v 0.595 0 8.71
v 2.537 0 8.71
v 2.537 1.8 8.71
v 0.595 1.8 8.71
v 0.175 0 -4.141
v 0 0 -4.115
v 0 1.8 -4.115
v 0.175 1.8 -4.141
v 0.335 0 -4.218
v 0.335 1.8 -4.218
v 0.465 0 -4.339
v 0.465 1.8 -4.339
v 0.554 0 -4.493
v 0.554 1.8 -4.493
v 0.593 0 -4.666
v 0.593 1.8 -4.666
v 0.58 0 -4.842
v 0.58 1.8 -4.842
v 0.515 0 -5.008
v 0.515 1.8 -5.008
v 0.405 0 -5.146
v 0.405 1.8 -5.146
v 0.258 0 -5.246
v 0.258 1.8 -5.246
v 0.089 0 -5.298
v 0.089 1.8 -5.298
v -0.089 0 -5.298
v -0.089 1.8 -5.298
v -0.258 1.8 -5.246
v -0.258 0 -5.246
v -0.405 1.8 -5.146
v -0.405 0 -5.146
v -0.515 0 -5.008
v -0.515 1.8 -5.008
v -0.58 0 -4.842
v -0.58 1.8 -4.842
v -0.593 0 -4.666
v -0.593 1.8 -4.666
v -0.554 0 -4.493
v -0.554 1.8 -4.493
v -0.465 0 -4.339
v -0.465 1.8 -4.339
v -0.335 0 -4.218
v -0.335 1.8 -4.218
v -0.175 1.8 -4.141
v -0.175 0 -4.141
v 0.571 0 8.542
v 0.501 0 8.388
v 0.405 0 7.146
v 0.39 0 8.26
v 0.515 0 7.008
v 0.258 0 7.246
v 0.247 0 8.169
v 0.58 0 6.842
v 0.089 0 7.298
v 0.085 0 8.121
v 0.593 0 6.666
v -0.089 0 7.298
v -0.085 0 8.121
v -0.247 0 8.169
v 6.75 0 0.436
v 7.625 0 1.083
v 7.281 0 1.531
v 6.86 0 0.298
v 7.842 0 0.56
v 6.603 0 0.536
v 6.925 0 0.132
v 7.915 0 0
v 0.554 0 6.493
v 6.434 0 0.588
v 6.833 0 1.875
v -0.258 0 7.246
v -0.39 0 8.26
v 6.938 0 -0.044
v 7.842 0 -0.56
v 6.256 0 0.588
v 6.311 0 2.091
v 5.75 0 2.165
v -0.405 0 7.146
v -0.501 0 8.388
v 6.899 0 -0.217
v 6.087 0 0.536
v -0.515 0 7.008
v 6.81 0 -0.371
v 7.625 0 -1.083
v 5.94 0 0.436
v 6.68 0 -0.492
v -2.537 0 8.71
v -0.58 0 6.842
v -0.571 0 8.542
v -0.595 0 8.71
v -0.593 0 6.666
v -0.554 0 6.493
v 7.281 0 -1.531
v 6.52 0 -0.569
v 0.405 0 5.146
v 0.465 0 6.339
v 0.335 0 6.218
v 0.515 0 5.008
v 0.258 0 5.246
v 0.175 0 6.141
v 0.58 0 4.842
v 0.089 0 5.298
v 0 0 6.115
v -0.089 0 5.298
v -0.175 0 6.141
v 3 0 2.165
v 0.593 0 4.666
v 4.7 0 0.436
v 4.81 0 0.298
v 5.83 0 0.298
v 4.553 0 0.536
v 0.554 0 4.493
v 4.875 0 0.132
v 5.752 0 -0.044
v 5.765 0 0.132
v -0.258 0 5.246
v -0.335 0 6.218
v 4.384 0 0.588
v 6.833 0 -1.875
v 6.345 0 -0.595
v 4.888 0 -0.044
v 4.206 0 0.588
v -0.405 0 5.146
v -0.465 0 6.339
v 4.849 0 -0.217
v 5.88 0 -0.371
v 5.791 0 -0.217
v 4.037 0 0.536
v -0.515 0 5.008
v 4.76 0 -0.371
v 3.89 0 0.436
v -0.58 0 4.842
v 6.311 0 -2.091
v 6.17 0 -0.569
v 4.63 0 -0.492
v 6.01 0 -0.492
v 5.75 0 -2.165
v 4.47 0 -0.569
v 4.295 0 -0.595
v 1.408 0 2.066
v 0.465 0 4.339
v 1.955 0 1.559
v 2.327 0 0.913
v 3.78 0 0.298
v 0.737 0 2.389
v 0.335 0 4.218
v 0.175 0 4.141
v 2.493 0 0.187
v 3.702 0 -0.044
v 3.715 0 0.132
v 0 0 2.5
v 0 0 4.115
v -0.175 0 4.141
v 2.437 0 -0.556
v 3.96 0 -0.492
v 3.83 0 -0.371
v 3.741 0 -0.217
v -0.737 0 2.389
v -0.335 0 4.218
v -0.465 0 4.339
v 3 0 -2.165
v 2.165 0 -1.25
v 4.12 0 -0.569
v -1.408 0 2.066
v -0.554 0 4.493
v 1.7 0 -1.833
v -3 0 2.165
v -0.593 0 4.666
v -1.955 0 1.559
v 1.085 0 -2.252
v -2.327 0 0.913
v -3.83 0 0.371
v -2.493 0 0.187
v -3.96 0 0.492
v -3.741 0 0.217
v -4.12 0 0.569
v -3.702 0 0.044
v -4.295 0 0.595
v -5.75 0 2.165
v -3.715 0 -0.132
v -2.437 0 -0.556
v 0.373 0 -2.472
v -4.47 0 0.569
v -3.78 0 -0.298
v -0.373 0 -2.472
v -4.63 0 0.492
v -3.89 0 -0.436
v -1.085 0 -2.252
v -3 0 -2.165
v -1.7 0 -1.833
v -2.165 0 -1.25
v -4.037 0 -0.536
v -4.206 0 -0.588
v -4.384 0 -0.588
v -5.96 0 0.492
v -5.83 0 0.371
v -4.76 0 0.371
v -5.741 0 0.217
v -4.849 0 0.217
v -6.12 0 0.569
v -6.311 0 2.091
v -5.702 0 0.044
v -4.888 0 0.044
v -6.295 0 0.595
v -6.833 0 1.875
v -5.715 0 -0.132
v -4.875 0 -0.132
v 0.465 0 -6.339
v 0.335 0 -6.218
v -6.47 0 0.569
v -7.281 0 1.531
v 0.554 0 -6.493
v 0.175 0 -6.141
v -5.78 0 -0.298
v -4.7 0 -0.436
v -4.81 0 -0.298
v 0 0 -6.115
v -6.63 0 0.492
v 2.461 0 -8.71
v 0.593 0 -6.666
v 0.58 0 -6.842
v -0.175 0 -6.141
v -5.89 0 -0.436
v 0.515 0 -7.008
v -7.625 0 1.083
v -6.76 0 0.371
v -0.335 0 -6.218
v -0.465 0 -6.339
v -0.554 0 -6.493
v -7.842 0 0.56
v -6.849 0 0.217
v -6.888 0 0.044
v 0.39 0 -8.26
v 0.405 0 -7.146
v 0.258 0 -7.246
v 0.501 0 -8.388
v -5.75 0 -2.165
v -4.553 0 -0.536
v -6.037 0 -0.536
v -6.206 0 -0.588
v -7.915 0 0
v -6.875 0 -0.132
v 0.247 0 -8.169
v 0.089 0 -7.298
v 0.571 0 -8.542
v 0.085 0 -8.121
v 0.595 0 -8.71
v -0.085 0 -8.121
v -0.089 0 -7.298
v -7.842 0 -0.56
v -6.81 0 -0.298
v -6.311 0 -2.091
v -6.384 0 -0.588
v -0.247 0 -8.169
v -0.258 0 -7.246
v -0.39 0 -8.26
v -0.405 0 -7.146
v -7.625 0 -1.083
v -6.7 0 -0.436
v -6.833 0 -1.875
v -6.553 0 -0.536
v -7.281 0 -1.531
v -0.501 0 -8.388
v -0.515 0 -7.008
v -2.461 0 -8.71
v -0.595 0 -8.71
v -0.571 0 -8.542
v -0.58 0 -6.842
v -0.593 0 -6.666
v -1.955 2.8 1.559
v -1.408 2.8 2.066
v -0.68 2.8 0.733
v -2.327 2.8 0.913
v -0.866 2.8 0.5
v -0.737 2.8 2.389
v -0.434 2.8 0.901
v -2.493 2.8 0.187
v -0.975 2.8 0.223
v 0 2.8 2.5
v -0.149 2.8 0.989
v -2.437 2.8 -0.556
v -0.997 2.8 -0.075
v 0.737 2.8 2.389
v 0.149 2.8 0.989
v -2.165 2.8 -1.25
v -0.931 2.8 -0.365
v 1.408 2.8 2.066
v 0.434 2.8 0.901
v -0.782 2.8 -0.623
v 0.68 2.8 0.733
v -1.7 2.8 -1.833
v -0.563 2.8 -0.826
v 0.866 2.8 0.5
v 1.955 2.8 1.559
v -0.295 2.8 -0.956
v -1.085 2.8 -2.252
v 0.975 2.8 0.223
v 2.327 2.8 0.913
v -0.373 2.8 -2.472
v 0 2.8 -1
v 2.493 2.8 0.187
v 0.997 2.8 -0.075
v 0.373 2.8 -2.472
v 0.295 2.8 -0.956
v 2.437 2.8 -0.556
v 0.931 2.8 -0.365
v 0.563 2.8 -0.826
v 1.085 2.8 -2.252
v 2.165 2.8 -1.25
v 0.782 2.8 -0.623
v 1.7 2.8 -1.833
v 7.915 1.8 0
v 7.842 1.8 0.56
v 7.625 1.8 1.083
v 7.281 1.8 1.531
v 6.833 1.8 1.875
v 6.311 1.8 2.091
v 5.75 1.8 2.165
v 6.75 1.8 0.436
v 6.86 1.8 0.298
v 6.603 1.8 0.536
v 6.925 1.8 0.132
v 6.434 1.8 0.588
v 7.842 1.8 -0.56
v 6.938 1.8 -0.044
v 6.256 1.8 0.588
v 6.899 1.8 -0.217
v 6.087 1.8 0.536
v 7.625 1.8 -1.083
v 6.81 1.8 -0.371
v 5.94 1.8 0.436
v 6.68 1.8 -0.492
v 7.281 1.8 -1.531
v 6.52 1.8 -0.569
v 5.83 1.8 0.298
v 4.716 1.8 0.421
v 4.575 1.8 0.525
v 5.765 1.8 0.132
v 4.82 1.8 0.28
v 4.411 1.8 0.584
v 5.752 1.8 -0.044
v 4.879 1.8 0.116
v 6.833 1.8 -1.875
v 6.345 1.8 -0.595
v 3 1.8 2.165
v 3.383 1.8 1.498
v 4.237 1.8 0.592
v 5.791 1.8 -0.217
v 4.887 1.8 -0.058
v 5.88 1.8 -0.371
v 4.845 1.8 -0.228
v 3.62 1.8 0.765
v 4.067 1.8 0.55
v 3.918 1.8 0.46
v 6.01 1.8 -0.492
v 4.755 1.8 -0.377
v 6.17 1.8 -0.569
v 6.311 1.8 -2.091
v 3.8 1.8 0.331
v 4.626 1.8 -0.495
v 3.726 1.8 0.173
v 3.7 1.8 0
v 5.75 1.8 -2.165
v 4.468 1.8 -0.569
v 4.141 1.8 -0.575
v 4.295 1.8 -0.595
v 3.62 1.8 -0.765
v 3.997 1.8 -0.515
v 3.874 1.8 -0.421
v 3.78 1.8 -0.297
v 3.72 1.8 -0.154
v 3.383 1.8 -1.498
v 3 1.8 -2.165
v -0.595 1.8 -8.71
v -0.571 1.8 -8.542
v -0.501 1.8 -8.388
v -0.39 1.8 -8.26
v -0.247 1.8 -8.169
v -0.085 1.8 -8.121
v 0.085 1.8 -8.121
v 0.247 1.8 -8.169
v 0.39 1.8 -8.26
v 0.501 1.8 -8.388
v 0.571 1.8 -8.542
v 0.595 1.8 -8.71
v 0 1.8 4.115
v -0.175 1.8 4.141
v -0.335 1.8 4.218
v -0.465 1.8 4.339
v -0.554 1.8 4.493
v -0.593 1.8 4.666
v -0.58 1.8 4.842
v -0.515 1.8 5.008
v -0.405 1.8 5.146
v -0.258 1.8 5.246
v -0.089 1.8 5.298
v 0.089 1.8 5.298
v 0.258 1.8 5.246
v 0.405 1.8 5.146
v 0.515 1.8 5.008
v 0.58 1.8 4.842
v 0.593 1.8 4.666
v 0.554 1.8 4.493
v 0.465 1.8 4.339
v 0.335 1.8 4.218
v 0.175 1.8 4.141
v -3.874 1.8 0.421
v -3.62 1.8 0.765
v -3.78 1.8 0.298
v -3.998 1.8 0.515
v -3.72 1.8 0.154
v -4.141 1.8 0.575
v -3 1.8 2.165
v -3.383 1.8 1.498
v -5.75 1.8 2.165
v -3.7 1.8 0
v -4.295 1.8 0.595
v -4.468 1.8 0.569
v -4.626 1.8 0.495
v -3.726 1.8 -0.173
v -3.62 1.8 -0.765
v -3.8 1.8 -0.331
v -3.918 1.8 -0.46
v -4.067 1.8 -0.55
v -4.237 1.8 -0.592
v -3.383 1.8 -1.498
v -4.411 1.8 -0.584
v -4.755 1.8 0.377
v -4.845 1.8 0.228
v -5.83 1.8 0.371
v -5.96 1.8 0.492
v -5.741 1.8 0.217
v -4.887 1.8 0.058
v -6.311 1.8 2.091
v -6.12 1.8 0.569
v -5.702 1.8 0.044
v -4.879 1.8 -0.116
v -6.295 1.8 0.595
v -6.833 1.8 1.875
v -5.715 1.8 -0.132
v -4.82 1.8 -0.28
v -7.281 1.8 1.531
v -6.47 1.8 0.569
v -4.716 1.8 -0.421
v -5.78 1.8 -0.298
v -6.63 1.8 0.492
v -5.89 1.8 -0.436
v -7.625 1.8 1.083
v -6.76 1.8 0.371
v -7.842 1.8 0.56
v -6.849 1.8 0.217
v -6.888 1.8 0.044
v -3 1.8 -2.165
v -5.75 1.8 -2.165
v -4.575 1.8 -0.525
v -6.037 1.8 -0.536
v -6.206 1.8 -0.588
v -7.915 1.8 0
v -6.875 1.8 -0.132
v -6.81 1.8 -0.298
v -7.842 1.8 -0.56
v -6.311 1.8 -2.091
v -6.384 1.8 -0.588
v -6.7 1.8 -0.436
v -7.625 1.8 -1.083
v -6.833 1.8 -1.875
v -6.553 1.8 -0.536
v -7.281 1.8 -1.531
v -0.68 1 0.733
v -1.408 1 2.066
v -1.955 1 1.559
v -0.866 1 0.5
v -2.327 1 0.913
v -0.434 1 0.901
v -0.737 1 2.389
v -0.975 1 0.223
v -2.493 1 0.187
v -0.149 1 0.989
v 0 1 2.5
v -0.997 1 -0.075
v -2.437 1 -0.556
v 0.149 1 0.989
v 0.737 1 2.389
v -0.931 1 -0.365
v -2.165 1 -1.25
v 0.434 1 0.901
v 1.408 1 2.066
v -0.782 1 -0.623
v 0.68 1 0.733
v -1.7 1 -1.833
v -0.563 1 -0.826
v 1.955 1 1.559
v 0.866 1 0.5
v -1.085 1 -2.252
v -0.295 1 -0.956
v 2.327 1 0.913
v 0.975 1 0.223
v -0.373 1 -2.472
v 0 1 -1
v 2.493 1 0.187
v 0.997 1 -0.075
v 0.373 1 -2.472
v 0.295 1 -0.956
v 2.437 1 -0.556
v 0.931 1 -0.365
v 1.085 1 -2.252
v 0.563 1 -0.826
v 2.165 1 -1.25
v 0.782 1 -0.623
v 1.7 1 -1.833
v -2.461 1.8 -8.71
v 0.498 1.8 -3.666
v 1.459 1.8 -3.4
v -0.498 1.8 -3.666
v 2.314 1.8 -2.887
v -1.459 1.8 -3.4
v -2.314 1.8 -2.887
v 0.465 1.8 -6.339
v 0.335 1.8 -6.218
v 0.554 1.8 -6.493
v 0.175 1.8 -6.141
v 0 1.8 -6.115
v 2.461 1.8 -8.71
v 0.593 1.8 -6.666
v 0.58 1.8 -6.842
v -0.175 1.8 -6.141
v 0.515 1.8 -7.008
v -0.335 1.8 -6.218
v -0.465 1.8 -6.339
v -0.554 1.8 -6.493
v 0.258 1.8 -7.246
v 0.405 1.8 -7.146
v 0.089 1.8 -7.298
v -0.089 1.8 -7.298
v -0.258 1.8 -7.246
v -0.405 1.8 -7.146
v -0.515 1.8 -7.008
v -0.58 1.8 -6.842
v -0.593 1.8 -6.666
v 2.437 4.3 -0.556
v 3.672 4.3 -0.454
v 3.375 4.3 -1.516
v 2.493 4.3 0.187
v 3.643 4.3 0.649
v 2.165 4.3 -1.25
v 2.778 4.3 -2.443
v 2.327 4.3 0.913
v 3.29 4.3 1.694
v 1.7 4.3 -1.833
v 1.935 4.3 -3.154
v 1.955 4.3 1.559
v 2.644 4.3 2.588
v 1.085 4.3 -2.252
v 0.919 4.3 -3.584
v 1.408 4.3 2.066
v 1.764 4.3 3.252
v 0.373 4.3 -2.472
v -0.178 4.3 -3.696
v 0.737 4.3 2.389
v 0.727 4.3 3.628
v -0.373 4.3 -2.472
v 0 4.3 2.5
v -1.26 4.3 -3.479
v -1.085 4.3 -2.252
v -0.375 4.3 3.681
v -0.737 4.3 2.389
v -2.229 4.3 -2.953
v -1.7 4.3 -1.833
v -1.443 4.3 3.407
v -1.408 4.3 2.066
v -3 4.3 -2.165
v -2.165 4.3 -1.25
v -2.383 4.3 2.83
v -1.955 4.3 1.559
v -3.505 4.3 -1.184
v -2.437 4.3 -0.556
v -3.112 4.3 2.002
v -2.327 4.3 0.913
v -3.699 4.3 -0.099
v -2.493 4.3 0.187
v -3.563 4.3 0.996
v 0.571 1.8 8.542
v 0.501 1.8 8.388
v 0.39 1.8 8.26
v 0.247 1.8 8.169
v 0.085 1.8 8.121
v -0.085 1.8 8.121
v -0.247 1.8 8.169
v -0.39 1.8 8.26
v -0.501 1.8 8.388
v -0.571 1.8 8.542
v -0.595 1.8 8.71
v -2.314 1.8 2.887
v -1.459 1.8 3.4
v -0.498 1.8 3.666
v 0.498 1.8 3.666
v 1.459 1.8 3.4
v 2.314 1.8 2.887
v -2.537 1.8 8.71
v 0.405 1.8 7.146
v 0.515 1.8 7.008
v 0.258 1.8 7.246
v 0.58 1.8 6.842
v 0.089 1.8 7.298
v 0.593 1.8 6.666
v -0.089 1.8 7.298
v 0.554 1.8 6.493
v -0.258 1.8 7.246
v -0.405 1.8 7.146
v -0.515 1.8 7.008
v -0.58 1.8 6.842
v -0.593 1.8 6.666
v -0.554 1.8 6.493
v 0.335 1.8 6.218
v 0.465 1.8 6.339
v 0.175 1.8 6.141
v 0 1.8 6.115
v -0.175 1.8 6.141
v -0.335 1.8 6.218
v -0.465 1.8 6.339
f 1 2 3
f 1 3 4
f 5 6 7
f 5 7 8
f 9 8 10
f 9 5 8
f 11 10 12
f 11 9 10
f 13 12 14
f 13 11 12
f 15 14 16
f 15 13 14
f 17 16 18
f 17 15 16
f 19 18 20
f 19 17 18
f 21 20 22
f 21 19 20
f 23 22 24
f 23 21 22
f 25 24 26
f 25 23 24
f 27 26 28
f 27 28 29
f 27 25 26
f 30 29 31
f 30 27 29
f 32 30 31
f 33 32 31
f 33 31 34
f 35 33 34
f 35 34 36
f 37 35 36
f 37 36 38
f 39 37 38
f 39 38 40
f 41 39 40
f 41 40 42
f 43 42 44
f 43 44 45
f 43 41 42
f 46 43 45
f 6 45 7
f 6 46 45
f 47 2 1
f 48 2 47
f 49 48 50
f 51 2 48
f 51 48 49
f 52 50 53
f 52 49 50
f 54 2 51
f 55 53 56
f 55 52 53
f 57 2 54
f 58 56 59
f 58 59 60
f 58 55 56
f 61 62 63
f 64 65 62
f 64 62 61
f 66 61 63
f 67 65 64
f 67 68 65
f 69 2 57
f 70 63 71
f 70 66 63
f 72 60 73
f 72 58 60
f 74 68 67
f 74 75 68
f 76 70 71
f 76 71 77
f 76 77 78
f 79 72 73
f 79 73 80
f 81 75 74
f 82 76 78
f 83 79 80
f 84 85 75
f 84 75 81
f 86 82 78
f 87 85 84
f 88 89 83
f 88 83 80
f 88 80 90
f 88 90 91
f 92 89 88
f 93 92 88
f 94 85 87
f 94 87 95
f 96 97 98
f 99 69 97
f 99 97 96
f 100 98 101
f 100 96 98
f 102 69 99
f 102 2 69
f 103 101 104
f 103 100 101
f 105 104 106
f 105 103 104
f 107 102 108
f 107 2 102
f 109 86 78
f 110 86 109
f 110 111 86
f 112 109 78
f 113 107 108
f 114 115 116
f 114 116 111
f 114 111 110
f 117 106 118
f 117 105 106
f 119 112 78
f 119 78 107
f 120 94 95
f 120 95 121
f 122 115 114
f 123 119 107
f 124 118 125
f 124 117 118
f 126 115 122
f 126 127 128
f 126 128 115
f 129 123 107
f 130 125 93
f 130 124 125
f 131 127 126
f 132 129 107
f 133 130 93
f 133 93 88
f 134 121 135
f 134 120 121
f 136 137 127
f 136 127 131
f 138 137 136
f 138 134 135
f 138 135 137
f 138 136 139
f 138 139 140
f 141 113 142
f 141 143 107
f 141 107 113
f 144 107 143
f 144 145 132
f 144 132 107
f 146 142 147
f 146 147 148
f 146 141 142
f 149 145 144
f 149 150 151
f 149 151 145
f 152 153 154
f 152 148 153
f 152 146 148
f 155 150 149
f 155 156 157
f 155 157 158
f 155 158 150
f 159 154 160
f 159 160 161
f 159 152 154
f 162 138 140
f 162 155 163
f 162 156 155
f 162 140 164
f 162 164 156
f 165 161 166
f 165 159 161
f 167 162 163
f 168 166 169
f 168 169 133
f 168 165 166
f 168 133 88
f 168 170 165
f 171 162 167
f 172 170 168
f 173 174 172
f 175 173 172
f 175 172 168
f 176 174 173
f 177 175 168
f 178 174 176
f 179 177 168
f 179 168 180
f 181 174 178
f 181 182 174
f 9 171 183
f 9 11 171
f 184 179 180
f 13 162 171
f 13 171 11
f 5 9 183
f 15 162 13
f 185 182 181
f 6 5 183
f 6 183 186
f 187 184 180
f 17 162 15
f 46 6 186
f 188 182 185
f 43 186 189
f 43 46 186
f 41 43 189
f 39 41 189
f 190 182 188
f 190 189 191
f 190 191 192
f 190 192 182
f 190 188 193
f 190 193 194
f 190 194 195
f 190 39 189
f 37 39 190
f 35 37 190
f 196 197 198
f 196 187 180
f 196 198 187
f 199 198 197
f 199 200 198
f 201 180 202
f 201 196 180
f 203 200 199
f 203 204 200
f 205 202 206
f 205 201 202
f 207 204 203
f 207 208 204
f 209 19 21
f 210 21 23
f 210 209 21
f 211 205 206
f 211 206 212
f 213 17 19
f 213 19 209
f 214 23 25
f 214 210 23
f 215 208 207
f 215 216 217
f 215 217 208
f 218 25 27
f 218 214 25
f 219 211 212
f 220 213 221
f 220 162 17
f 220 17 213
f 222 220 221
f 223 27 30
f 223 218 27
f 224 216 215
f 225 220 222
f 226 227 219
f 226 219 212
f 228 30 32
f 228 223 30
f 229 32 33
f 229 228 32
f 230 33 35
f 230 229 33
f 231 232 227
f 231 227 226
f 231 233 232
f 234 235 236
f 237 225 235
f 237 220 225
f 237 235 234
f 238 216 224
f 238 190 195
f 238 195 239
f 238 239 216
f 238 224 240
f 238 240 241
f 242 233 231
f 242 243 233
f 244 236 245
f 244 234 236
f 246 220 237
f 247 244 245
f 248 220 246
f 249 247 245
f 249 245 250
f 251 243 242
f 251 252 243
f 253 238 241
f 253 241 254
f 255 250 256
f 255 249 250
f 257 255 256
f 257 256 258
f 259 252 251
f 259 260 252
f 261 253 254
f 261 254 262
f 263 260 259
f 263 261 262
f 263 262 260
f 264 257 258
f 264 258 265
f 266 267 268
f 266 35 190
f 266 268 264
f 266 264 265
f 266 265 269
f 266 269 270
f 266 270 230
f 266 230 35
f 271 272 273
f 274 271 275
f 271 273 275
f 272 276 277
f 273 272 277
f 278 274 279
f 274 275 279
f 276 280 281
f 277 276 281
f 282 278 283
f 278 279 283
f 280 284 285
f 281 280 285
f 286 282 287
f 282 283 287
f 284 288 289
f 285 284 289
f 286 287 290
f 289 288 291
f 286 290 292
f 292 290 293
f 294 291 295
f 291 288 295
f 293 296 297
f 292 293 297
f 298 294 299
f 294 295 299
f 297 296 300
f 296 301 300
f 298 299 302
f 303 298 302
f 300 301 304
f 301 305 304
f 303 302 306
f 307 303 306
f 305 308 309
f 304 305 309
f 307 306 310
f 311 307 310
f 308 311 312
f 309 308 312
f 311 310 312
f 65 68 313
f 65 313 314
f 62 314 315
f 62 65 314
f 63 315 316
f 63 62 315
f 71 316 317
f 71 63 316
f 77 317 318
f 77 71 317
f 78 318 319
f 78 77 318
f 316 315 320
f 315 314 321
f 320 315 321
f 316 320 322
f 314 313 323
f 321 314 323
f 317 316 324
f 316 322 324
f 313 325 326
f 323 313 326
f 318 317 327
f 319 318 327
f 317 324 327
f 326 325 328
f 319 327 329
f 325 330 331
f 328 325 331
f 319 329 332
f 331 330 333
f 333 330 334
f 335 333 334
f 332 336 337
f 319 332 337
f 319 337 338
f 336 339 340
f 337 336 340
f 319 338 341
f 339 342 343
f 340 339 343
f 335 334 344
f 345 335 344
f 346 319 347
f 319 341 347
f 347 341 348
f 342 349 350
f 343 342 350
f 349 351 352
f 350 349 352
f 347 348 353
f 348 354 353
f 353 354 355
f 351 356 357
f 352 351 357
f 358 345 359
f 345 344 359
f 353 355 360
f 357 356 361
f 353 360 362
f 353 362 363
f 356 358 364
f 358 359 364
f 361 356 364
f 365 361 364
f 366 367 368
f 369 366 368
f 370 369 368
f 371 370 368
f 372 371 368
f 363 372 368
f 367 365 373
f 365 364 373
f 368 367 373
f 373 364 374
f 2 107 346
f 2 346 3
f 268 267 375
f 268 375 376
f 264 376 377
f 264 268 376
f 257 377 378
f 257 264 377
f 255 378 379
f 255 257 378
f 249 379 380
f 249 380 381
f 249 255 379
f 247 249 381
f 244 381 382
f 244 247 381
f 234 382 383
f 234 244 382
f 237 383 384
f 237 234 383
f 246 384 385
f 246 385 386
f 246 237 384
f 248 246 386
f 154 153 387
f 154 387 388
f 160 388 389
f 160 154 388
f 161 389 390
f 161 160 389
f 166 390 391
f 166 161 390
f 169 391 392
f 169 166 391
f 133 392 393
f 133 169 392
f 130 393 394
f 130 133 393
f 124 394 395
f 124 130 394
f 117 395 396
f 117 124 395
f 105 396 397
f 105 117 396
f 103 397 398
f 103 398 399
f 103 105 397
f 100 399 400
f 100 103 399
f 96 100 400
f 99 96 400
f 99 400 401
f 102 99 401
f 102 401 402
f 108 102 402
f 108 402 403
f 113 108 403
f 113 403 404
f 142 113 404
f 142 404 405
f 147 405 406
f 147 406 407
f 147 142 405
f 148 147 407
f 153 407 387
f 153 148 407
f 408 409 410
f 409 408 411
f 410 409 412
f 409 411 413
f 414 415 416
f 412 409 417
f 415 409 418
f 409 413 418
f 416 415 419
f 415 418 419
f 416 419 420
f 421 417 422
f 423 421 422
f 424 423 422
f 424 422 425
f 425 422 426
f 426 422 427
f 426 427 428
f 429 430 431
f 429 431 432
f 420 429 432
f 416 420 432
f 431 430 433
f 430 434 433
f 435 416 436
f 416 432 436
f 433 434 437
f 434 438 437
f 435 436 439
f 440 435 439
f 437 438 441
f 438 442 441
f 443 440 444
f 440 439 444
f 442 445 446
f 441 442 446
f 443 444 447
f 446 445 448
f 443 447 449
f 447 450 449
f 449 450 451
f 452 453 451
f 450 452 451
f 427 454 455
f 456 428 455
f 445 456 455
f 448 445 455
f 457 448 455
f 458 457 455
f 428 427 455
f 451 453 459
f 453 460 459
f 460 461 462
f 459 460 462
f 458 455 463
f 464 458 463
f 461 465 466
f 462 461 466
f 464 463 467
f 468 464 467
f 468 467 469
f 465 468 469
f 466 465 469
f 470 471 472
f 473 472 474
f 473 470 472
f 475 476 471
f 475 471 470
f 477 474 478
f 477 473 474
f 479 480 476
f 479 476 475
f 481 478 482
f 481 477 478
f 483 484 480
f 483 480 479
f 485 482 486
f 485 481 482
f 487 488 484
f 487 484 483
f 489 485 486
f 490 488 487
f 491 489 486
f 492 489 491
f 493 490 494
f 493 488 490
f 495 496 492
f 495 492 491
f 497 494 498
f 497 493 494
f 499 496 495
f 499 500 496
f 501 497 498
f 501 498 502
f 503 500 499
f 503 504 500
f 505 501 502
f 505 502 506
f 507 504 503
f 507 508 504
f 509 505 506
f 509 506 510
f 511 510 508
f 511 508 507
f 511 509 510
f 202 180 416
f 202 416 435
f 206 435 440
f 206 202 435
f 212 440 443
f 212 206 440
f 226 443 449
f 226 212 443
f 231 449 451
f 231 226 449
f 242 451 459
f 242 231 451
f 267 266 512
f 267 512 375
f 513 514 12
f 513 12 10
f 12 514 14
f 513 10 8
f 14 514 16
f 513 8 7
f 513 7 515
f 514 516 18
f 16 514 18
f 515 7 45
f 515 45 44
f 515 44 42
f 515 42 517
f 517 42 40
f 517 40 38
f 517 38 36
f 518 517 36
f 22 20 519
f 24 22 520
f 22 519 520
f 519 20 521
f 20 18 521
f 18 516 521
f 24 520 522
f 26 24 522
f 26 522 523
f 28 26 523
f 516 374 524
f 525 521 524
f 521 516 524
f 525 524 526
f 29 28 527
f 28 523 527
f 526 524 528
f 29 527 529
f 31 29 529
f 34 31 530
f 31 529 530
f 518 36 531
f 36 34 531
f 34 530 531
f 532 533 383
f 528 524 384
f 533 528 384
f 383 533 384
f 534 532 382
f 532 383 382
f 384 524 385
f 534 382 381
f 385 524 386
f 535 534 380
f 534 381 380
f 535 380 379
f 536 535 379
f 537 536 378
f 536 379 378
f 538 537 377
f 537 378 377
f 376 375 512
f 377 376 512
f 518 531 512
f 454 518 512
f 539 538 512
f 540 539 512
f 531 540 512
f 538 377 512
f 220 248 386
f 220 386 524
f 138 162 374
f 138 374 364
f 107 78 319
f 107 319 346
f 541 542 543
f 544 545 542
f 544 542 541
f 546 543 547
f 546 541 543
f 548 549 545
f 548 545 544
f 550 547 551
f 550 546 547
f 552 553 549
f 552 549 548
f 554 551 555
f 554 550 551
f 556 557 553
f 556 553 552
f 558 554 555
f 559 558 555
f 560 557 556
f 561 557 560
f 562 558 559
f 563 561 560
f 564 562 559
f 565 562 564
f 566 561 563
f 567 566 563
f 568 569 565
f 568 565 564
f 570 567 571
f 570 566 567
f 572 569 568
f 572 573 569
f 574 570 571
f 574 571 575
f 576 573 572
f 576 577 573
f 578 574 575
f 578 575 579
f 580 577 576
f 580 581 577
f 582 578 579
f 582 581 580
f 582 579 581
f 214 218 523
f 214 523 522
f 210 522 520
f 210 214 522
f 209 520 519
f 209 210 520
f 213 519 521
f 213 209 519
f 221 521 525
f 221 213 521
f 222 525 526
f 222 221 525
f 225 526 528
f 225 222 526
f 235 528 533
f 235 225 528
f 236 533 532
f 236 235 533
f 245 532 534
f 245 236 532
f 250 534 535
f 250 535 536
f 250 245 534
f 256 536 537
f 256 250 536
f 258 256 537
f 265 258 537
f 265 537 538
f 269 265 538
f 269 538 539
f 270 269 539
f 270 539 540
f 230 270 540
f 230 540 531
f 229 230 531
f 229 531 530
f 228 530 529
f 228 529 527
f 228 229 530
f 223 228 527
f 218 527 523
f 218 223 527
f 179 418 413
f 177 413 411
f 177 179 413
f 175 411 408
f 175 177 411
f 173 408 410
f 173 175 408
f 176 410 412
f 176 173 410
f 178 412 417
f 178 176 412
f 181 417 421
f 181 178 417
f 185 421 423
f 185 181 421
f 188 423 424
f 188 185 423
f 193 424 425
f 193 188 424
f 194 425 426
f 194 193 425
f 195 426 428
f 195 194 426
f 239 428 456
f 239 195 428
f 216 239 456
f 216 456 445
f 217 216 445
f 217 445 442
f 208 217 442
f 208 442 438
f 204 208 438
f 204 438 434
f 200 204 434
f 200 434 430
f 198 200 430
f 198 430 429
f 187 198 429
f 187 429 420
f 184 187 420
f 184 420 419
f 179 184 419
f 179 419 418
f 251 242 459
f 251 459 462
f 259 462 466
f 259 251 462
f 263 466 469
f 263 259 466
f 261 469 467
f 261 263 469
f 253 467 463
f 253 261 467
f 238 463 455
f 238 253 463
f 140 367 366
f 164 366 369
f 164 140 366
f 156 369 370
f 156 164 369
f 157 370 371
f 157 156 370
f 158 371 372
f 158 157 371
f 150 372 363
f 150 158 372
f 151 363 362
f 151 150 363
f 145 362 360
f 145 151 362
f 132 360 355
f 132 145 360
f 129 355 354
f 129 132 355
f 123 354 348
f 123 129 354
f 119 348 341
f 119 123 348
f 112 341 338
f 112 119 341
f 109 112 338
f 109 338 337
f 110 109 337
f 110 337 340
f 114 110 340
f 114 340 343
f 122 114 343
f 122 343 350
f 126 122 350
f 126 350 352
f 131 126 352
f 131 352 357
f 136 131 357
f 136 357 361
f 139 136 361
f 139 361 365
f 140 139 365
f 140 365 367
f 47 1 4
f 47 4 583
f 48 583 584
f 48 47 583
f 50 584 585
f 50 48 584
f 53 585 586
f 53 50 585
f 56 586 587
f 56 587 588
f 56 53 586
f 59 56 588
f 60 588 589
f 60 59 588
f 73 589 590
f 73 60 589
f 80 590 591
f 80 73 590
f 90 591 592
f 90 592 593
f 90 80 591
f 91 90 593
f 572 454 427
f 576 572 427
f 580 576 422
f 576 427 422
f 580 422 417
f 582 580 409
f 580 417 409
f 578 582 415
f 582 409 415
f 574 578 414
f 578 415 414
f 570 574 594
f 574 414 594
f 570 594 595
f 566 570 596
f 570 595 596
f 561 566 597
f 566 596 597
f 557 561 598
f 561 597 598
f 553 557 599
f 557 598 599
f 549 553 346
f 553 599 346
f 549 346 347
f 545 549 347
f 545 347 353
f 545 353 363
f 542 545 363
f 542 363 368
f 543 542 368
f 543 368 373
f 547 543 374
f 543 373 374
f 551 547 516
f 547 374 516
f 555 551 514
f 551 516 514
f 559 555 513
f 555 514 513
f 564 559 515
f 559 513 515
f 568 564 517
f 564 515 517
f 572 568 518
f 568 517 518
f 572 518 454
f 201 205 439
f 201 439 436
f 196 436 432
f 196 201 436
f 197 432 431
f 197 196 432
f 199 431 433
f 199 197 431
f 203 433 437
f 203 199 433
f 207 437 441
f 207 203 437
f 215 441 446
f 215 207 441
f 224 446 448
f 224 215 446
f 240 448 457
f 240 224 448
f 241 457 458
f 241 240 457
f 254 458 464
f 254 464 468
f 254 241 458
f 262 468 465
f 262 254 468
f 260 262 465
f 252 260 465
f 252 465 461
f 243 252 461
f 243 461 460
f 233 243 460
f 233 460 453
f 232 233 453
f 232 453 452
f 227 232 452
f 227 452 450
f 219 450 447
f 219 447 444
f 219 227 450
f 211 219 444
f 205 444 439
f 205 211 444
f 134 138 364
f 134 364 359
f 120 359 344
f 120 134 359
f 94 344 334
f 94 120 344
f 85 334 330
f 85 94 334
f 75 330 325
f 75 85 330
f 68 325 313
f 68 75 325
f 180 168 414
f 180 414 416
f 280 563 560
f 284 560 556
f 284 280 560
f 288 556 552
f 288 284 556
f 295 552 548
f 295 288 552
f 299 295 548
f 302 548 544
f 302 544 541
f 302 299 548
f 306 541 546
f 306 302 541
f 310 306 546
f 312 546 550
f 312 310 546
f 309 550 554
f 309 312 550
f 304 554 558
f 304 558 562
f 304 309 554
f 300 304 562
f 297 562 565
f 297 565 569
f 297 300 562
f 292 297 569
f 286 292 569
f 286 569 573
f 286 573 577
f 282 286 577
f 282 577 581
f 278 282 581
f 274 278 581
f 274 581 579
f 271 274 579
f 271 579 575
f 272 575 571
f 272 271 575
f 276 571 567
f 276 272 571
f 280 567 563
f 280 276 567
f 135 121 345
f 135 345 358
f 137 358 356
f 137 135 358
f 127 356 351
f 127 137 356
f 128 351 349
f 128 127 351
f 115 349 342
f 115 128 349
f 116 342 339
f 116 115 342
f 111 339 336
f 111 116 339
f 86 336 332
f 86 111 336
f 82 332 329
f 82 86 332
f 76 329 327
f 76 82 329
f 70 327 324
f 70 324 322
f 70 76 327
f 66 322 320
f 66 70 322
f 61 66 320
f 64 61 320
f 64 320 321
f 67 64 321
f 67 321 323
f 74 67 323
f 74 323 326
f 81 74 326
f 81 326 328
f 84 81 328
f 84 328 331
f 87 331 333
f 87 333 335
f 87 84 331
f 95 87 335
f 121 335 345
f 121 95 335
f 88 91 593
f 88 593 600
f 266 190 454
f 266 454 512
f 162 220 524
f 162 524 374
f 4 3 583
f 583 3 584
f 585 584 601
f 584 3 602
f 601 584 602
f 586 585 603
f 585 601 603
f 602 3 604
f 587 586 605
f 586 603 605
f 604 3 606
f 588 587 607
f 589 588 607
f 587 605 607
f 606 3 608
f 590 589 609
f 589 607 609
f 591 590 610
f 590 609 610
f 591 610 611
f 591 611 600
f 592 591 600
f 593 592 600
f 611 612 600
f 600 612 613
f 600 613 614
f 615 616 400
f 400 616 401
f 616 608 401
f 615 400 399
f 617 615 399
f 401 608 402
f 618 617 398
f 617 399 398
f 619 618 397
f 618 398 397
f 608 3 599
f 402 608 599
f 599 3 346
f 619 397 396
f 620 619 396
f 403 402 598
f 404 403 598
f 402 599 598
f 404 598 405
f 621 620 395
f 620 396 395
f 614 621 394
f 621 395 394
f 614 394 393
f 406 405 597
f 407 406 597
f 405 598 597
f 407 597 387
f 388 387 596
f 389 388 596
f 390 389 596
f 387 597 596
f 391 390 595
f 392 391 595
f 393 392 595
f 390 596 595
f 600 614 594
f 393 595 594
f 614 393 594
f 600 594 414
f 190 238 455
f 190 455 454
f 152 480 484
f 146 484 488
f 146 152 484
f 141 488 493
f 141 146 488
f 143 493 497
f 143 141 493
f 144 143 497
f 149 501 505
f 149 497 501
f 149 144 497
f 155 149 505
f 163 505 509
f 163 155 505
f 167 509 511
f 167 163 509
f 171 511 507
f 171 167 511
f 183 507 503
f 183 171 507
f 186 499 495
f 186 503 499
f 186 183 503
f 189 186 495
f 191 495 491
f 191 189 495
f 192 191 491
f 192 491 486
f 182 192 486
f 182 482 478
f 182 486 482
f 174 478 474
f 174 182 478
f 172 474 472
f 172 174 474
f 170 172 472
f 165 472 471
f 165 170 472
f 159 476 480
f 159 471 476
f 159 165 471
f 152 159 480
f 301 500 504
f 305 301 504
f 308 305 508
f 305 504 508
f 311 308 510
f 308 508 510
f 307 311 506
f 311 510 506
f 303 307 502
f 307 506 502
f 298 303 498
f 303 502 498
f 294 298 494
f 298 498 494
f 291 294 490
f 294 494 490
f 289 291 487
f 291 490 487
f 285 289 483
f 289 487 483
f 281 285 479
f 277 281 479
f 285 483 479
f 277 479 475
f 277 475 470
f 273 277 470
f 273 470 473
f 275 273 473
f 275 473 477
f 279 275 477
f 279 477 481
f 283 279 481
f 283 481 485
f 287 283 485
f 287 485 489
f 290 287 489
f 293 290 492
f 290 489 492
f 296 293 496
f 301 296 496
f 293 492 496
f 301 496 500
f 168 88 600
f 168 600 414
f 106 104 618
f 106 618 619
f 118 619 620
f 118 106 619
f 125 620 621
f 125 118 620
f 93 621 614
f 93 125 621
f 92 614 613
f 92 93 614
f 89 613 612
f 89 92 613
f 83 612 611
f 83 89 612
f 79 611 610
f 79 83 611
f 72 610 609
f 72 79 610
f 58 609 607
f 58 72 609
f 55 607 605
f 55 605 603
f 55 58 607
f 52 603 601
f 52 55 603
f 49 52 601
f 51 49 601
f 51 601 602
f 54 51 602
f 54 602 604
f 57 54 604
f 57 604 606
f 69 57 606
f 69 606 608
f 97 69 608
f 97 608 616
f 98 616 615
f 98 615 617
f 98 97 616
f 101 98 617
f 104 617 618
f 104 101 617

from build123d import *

# Parameters (mm, degrees)
SKETCH2_R           = 2.5
SKETCH2_R_2         = 0.595
BOSS_EXTRUDE1_DEPTH = 1.8
SKETCH3_R           = 3.7
SKETCH3_R_2         = 2.5
BOSS_EXTRUDE2_DEPTH = 2.5
SKETCH4_R           = 2.5
SKETCH4_R_2         = 1
BOSS_EXTRUDE3_DEPTH = 1.8


with BuildPart() as part:
    # Sketch2 → Boss-Extrude1 (new body)
    with BuildSketch(Plane(origin=(0, 0, 0), x_dir=(1, 0, 0), z_dir=(0, 1, 0))):
        with BuildLine():
            Line((-2.460864044, 8.71), (-0.595, 8.71))
            ThreePointArc((-0.595, 8.71), (0, 8.115), (0.595, 8.71))
            Line((0.595, 8.71), (2.460864044, 8.71))
            Line((2.460864044, 8.71), (3.000462464, 2.165))
            Line((3.000462464, 2.165), (5.750462464, 2.165))
            ThreePointArc((5.750462464, 2.165), (7.281348646, 1.530886181), (7.915462464, 0))
            ThreePointArc((7.915462464, 0), (7.281348646, -1.530886181), (5.750462464, -2.165))
            Line((5.750462464, -2.165), (3.000462464, -2.165))
            Line((3.000462464, -2.165), (2.537213308, -8.71))
            Line((2.537213308, -8.71), (0.595, -8.71))
            ThreePointArc((0.595, -8.71), (0, -8.115), (-0.595, -8.71))
            Line((-0.595, -8.71), (-2.537213308, -8.71))
            Line((-2.537213308, -8.71), (-3.000462464, -2.165))
            Line((-3.000462464, -2.165), (-5.750462464, -2.165))
            ThreePointArc((-5.750462464, -2.165), (-7.281348646, -1.530886181), (-7.915462464, 0))
            ThreePointArc((-7.915462464, 0), (-7.281348646, 1.530886181), (-5.750462464, 2.165))
            Line((-5.750462464, 2.165), (-3.000462464, 2.165))
            Line((-3.000462464, 2.165), (-2.460864044, 8.71))
        make_face()
        with Locations(Location((0, 0, 0), (0, 0, 270))):
            Circle(SKETCH2_R, mode=Mode.SUBTRACT)
        with Locations(Location((-4.295, 0, 0), (0, 0, 270))):
            Circle(SKETCH2_R_2, mode=Mode.SUBTRACT)
        with Locations(Location((-6.295, 0, 0), (0, 0, 270))):
            Circle(SKETCH2_R_2, mode=Mode.SUBTRACT)
        with Locations(Location((0, 4.71, 0), (0, 0, 270))):
            Circle(SKETCH2_R_2, mode=Mode.SUBTRACT)
        with Locations(Location((0, 6.71, 0), (0, 0, 270))):
            Circle(SKETCH2_R_2, mode=Mode.SUBTRACT)
        with Locations(Location((0, -4.71, 0), (0, 0, 90))):
            Circle(SKETCH2_R_2, mode=Mode.SUBTRACT)
        with Locations(Location((0, -6.71, 0), (0, 0, 90))):
            Circle(SKETCH2_R_2, mode=Mode.SUBTRACT)
        with Locations(Location((6.345, 0, 0), (0, 0, 90))):
            Circle(SKETCH2_R_2, mode=Mode.SUBTRACT)
        with Locations(Location((4.295, 0, 0), (0, 0, 90))):
            Circle(SKETCH2_R_2, mode=Mode.SUBTRACT)
    extrude(amount=BOSS_EXTRUDE1_DEPTH)

    # Sketch3 → Boss-Extrude2 (add)
    with BuildSketch(Plane(origin=(0, 1.8, 0), x_dir=(1, 0, 0), z_dir=(0, 1, 0))):
        with Locations(Location((0, 0, 0), (0, 0, 144.187462738))):
            Circle(SKETCH3_R)
        with Locations(Location((0, 0, 0), (0, 0, 270))):
            Circle(SKETCH3_R_2, mode=Mode.SUBTRACT)
    extrude(amount=BOSS_EXTRUDE2_DEPTH)

    # Sketch4 → Boss-Extrude3 (add)
    with BuildSketch(Plane(origin=(0, 1, 0), x_dir=(-1, 0, 0), z_dir=(0, -1, 0))):
        with Locations(Location((0, 0, 0), (0, 0, 90))):
            Circle(SKETCH4_R)
        with Locations(Location((0, 0, 0), (0, 0, 90))):
            Circle(SKETCH4_R_2, mode=Mode.SUBTRACT)
    extrude(amount=-BOSS_EXTRUDE3_DEPTH)


solid = part.part
